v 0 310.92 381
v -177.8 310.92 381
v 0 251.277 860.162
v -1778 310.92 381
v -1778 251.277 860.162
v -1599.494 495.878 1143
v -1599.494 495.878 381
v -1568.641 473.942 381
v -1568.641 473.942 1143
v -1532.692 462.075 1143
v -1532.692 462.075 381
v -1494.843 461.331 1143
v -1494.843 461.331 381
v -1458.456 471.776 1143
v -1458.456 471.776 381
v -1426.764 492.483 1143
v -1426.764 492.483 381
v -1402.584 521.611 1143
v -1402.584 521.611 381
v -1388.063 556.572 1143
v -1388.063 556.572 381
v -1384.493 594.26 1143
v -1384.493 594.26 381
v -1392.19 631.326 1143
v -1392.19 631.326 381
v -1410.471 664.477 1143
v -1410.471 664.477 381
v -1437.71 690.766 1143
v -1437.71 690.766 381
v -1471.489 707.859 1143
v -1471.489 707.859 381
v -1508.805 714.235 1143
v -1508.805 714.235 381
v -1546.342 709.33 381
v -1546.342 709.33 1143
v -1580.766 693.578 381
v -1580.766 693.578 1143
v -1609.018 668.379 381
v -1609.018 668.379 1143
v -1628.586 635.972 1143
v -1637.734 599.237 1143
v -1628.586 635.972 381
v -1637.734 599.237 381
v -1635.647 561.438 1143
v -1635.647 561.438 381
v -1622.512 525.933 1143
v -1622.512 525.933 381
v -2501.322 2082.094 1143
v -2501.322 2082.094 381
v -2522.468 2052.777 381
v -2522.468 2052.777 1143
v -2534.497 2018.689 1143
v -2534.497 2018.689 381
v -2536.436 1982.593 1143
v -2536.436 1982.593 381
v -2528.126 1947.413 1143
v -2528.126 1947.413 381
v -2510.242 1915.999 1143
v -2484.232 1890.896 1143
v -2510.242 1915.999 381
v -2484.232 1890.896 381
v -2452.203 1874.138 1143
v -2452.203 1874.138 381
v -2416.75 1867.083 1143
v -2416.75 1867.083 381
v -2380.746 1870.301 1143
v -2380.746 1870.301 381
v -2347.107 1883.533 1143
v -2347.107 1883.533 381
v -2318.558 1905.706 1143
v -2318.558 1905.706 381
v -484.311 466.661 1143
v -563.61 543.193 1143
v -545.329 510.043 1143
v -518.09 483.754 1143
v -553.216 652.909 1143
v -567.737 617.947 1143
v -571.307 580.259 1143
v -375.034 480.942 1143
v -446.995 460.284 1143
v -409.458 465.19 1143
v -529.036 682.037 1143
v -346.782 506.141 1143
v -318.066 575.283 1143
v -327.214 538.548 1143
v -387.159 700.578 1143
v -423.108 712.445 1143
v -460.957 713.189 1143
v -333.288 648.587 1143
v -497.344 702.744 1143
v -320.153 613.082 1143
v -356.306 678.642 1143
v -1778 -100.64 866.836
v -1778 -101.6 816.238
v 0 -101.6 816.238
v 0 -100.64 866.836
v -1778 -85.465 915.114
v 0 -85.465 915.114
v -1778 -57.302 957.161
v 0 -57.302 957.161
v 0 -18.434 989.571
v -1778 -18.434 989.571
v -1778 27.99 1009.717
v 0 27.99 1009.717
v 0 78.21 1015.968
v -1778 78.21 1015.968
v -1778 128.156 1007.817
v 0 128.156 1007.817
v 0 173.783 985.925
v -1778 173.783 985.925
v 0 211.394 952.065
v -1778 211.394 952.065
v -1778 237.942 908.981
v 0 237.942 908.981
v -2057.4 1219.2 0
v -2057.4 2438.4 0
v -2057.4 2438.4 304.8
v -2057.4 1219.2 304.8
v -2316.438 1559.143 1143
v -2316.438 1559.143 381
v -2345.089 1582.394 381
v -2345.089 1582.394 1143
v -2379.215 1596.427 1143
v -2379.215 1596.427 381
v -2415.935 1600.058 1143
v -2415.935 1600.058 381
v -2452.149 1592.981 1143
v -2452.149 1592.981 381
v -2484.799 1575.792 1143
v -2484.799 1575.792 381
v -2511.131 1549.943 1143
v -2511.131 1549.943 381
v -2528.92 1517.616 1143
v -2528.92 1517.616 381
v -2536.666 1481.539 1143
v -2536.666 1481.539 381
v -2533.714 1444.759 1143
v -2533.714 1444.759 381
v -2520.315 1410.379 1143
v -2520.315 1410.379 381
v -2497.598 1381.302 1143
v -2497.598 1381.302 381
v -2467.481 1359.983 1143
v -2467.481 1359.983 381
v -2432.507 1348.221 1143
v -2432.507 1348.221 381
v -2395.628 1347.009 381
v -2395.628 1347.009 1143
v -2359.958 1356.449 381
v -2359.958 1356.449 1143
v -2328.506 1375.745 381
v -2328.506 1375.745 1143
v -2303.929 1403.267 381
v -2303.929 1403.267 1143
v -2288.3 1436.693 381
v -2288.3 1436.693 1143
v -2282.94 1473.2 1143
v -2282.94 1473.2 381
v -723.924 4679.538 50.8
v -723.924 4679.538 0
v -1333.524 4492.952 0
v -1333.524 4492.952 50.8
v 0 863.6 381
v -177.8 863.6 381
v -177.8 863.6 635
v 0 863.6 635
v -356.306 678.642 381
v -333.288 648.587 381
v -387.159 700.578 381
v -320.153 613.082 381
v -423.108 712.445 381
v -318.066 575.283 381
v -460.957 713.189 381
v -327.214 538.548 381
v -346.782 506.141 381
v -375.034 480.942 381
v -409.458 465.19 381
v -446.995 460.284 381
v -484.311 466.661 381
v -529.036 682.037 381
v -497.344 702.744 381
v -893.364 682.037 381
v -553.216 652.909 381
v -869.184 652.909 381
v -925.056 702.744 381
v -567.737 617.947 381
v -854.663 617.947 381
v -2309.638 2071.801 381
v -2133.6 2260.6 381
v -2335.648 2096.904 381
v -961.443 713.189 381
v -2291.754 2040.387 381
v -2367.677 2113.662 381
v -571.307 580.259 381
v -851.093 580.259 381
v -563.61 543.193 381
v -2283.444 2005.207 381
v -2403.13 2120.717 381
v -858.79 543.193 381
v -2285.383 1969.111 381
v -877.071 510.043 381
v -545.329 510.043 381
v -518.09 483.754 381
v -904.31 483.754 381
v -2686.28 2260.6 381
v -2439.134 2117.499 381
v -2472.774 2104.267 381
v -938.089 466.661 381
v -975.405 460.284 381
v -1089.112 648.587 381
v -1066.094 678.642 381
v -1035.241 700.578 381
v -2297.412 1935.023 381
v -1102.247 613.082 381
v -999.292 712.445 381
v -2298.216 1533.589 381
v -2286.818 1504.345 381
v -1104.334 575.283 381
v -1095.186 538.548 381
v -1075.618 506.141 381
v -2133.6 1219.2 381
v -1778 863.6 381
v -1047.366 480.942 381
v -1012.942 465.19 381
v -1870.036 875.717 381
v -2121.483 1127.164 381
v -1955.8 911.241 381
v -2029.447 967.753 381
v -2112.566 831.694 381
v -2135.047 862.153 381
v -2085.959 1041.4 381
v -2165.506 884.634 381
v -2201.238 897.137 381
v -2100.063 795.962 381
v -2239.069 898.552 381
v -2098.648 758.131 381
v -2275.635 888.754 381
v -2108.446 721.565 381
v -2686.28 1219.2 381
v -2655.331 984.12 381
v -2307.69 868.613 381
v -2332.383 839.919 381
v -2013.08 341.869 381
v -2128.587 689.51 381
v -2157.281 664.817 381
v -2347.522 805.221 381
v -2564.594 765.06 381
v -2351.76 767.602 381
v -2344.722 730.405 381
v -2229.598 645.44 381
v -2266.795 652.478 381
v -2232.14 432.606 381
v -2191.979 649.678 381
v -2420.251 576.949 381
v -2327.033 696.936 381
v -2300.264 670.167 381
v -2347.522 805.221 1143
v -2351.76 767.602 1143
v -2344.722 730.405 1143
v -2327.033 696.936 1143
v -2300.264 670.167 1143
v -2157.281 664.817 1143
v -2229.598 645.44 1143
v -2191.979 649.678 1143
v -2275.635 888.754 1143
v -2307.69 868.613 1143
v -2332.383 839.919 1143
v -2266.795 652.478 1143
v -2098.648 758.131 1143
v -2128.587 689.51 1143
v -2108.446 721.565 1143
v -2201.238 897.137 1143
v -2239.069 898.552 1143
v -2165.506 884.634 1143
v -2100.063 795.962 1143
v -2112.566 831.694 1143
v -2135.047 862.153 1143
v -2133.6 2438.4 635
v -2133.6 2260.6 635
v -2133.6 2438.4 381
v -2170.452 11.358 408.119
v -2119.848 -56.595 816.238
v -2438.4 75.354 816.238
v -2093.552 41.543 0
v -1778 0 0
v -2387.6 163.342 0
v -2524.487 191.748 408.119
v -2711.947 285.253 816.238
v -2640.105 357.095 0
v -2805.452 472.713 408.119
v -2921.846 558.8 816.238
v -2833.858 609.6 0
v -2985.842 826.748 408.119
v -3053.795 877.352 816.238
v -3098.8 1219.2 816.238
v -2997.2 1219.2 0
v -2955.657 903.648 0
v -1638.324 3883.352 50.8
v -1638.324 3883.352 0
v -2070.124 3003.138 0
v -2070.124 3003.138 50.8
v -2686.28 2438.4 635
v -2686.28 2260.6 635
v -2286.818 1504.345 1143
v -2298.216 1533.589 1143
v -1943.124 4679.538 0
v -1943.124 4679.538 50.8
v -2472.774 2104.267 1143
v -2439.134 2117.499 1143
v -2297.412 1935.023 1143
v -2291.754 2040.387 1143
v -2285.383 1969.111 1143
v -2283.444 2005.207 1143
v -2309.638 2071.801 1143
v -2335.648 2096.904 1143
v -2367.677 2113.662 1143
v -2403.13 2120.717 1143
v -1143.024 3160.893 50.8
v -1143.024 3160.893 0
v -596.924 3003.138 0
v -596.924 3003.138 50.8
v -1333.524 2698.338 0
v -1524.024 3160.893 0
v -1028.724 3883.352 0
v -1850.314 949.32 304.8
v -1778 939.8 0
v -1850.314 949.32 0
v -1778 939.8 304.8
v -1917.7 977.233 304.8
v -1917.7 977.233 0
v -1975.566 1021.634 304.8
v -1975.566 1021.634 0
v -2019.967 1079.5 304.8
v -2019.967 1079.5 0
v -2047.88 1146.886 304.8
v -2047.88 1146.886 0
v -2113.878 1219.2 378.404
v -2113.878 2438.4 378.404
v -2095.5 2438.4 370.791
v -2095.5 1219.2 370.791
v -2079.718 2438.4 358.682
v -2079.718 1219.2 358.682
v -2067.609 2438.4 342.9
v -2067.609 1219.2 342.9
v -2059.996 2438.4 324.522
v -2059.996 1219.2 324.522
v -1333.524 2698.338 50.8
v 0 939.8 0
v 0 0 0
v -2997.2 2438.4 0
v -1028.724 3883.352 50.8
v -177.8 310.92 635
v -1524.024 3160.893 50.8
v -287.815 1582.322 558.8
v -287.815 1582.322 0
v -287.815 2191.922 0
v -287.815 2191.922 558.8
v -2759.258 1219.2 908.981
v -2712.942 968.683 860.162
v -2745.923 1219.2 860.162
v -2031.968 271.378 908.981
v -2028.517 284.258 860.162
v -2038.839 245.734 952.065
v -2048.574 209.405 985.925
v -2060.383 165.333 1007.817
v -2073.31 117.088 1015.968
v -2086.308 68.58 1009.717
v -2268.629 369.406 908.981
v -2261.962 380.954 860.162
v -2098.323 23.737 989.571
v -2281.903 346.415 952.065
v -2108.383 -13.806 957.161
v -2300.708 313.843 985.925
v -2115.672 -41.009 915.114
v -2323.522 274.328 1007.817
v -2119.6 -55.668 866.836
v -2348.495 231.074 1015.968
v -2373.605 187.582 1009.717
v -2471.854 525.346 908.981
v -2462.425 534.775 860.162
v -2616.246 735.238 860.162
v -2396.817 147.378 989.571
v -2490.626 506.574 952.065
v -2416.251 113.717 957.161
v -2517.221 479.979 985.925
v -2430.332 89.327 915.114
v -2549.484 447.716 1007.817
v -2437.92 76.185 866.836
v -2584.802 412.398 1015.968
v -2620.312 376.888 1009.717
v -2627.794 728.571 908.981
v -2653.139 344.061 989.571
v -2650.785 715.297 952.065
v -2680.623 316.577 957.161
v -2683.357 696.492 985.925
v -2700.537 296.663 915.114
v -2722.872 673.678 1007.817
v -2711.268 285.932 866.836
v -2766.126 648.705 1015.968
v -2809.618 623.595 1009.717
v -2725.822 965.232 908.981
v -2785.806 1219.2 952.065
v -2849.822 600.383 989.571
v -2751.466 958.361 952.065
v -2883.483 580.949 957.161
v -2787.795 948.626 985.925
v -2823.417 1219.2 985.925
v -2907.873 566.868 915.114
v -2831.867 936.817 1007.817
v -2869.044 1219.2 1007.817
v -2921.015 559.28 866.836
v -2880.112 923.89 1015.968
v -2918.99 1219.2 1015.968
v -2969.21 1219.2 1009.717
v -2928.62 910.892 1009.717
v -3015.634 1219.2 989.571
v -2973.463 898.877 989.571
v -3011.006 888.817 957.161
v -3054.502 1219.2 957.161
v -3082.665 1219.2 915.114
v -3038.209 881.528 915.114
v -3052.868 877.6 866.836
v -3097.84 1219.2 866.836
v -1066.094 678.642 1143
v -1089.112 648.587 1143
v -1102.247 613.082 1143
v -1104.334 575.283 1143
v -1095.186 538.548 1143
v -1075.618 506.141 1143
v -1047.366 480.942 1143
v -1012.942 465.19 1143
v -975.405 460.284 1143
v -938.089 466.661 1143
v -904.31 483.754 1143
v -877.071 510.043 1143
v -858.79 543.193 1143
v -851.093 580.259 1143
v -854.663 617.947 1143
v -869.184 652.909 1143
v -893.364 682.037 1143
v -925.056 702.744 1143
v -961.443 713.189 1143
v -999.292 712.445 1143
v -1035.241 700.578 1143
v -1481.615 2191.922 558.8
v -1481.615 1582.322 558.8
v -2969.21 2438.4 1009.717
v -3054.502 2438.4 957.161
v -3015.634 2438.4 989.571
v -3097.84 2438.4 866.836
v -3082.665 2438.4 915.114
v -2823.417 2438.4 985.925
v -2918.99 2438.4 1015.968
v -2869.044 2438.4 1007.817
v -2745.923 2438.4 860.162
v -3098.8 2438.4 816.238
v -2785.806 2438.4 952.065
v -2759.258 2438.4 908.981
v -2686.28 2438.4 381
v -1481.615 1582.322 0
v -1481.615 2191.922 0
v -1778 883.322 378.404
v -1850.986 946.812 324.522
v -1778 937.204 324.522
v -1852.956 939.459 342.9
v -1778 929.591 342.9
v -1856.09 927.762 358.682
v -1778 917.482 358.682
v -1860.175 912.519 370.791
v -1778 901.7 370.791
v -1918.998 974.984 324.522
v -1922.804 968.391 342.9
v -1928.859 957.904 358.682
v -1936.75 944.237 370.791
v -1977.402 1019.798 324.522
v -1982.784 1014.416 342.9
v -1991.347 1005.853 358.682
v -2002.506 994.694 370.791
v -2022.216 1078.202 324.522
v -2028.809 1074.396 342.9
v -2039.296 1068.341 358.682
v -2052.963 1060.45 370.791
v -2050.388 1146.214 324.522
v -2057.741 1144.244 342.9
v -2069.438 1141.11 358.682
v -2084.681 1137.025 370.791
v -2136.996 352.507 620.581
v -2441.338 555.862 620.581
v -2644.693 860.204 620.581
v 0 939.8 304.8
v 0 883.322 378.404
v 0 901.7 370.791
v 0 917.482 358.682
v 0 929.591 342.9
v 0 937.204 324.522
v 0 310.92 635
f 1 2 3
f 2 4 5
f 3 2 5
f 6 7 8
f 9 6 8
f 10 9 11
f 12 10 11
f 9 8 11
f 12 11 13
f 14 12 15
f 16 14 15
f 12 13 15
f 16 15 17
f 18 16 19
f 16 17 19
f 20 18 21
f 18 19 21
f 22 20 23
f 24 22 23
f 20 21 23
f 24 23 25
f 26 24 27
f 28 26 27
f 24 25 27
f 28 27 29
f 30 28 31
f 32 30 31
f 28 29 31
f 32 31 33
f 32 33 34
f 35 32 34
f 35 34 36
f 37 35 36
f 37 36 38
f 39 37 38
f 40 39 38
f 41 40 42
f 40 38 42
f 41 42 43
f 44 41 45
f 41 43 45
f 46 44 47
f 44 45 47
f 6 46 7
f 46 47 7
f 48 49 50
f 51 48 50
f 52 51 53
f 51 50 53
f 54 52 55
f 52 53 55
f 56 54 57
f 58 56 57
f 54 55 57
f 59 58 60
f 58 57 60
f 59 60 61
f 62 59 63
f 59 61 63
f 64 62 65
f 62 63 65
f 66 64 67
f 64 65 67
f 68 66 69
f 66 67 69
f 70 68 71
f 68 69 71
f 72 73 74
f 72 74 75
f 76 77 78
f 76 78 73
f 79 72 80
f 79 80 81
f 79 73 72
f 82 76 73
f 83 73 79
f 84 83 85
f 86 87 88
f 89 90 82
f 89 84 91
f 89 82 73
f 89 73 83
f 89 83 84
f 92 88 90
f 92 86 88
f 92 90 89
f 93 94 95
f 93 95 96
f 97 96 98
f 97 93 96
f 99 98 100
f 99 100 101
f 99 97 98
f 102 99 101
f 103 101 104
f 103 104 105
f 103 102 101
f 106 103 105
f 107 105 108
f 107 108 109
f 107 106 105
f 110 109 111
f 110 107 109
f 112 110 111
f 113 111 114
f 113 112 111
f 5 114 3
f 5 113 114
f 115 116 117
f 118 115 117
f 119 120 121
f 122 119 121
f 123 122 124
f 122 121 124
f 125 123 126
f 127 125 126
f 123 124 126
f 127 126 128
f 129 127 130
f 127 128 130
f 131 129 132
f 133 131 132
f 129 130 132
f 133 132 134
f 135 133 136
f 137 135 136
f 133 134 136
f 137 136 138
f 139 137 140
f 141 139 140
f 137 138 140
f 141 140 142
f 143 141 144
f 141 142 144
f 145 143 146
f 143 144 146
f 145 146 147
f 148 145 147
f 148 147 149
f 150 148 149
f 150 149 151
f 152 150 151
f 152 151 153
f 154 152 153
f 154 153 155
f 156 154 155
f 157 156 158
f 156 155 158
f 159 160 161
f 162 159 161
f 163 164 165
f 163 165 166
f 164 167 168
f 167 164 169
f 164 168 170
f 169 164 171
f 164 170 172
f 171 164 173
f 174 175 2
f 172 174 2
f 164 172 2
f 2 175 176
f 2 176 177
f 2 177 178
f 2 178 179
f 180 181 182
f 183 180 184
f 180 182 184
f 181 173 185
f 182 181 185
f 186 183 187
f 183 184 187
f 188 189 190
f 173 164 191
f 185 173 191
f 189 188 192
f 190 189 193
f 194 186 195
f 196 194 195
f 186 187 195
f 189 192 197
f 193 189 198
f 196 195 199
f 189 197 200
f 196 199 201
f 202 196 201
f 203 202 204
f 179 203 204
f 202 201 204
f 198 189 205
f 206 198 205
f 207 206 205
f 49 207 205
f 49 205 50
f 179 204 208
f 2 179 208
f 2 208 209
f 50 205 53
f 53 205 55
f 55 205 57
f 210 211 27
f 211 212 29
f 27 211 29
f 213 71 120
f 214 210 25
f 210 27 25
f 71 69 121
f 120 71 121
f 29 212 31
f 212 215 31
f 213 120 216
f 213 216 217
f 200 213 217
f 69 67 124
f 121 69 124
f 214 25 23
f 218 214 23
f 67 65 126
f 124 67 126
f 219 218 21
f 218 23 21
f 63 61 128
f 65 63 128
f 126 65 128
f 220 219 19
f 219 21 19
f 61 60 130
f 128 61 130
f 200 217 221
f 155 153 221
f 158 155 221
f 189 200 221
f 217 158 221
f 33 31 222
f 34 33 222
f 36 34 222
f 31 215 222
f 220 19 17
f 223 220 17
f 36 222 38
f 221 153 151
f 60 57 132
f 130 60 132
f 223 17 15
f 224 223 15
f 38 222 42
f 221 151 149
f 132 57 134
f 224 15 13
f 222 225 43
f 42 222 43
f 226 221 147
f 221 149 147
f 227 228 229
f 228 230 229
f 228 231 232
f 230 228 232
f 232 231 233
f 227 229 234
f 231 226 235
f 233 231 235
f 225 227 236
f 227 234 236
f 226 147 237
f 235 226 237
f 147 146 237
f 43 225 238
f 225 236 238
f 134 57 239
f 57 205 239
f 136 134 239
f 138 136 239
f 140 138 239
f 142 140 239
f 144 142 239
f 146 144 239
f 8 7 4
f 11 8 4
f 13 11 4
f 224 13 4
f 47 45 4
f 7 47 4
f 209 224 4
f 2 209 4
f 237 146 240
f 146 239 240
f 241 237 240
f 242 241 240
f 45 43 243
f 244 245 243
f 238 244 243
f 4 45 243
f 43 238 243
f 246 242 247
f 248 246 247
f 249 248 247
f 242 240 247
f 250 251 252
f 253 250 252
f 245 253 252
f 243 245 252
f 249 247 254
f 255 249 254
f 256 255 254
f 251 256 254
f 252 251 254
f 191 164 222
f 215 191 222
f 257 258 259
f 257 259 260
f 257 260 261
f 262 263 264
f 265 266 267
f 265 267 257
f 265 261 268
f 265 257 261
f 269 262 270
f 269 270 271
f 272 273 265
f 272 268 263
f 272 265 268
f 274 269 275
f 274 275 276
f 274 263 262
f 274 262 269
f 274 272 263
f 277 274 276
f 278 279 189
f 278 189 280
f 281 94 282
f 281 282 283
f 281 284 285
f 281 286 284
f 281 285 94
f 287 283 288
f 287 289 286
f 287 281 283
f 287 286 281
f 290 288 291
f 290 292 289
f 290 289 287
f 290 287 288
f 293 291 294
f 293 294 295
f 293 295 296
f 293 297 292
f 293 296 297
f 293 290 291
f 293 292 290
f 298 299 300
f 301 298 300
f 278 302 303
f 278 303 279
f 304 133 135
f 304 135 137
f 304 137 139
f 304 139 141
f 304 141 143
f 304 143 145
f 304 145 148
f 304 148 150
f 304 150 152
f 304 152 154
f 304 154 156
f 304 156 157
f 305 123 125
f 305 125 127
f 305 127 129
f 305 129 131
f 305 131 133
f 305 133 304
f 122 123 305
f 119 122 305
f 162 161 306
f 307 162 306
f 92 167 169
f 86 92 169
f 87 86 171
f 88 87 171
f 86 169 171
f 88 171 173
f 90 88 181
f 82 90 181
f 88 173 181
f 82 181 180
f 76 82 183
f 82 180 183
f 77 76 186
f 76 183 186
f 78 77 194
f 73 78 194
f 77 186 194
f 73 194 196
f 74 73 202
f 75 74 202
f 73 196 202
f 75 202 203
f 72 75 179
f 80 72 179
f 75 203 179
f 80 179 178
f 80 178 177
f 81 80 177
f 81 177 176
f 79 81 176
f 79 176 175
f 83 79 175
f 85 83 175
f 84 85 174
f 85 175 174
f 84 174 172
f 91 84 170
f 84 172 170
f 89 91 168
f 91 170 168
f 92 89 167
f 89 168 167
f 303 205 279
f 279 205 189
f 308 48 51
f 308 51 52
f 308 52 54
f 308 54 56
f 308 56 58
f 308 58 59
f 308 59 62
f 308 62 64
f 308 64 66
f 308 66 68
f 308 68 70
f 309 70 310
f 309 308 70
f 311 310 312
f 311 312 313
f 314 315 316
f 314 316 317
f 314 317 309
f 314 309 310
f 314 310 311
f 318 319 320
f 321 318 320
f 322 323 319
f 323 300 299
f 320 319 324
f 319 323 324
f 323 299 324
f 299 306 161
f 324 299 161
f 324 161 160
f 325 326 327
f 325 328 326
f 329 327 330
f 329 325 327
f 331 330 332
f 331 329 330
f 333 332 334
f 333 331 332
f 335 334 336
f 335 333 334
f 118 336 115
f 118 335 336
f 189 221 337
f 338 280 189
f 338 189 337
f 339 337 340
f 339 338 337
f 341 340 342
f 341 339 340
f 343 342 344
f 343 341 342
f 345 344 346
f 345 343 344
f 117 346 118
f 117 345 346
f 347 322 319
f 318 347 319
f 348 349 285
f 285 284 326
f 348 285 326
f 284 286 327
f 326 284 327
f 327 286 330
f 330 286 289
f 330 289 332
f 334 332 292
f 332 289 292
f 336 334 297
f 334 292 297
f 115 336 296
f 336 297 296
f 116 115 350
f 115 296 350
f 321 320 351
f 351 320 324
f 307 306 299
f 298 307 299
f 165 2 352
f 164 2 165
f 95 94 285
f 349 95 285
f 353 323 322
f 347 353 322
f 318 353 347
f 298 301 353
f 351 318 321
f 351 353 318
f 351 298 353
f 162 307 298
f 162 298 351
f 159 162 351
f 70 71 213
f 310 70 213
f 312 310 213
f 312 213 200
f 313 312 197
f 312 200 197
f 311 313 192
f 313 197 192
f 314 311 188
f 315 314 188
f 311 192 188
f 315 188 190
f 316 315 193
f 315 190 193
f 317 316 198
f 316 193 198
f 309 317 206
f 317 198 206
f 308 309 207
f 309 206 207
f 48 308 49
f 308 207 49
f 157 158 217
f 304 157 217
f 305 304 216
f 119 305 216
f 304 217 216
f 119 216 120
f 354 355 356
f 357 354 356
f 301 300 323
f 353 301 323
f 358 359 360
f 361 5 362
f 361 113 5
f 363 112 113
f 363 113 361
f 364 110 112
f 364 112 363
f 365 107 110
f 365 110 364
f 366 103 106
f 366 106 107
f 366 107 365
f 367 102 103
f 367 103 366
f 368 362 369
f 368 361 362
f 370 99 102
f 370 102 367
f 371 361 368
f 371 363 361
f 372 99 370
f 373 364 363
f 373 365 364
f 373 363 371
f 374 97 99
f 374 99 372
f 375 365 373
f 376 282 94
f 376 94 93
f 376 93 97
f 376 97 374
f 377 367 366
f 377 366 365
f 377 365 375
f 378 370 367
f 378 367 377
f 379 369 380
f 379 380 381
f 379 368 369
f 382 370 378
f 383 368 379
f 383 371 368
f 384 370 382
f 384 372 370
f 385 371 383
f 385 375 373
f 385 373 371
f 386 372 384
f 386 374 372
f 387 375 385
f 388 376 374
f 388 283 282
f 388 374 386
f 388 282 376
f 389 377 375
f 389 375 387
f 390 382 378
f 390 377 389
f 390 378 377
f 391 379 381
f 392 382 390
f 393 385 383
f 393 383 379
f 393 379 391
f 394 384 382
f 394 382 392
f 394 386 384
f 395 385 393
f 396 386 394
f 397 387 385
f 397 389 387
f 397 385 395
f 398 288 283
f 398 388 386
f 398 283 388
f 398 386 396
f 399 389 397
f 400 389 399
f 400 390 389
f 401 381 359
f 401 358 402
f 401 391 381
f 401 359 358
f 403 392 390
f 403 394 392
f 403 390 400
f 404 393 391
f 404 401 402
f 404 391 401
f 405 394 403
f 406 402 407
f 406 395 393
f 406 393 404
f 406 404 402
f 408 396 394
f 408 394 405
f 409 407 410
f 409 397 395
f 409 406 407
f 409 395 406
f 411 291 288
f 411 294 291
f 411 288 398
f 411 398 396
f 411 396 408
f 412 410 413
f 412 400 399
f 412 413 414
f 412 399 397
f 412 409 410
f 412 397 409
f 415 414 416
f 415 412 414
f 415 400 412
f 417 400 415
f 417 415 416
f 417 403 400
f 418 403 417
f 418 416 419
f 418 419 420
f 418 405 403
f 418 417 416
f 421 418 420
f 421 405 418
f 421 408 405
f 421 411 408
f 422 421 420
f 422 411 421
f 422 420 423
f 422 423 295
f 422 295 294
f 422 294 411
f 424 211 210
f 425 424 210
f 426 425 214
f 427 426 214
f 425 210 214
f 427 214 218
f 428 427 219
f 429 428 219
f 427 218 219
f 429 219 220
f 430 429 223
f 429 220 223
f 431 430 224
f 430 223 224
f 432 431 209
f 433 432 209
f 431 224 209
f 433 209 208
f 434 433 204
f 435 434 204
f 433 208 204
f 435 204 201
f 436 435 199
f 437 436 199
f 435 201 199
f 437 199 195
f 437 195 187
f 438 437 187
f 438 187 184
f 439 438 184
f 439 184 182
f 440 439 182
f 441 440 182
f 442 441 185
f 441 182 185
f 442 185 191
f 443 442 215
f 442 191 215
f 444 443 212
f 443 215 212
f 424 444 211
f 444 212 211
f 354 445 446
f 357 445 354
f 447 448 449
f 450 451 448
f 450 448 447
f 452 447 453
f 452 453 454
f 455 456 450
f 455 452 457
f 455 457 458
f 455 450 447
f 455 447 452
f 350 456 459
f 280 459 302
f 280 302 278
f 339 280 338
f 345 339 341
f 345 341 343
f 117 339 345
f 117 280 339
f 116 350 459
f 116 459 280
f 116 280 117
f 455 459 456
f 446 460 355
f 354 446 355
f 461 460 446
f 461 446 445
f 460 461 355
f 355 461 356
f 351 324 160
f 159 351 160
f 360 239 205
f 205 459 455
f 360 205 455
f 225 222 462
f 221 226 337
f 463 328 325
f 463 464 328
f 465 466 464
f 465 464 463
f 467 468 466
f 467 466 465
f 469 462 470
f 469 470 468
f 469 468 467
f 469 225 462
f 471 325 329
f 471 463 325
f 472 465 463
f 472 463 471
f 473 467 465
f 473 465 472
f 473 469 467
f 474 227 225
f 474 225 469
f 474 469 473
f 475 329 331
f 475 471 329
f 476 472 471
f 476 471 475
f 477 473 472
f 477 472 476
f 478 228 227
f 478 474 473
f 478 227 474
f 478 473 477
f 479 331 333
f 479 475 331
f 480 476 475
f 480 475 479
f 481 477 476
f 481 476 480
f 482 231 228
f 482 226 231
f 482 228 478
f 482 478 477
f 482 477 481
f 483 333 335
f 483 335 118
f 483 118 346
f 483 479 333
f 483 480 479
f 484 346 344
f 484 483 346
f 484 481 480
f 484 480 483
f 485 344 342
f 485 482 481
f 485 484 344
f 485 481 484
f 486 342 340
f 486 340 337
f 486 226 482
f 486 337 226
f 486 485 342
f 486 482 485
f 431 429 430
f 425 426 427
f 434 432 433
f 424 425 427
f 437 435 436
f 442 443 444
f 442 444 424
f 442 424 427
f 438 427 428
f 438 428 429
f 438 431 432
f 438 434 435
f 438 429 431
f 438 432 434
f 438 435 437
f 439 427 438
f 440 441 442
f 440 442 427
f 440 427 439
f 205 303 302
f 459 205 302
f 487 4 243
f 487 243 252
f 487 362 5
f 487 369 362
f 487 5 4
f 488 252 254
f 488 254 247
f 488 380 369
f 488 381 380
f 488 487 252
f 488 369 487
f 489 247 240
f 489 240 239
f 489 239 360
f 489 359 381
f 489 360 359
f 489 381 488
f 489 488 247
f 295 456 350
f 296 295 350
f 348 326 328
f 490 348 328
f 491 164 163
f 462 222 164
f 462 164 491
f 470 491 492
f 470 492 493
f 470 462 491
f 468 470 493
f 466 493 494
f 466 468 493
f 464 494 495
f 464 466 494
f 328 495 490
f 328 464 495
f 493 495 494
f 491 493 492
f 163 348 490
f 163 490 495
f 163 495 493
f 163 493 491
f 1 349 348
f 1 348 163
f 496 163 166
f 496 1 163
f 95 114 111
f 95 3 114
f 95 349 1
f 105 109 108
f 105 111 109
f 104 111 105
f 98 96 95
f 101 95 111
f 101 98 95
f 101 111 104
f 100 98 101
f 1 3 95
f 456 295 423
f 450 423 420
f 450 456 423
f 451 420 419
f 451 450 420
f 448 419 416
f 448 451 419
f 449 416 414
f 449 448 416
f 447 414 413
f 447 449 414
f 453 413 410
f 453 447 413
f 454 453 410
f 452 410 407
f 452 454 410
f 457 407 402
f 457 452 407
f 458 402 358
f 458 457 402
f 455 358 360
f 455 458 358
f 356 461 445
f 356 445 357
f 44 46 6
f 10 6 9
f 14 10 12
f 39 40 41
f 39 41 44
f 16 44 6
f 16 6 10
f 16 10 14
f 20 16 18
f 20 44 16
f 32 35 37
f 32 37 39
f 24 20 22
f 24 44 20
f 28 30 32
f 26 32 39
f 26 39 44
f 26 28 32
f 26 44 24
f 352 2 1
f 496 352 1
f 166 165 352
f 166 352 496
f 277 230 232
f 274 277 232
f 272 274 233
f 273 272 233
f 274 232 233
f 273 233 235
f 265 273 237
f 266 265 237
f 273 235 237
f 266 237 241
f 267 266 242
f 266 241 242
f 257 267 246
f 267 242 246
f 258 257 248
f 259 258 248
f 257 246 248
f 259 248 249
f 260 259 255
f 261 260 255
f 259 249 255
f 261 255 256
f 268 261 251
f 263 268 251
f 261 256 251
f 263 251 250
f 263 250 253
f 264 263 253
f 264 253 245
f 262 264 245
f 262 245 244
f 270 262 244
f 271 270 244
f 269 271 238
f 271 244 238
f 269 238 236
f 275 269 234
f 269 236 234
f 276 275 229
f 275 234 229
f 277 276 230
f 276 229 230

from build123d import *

# Parameters (mm, degrees)
F3_W     = 552.6802154407
F3_H     = 177.8
F3_W_2   = 177.8
F3_H_2   = 552.6802154407
F4_DEPTH = 254
F5_DEPTH = 762
F6_W     = 1193.8
F6_H     = 609.6
F7_DEPTH = 558.8
F8_DEPTH = 50.8


with BuildPart() as f2:
    # F2: sweep along a path in F1
    with BuildLine(Plane.XY) as f2_path:
        Line((0, 0), (-1778, 0))
        ThreePointArc((-1778, 0), (-2640.1045876226, 357.0954123774), (-2997.2, 1219.2))
        Line((-2997.2, 1219.2), (-2997.2, 2438.4))
    # F0 (on Right) → F2 (sweep)
    with BuildSketch(Plane.YZ):
        with BuildLine():
            Line((251.2768326259, 860.1619044934), (-101.6, 816.2380955066))
            Line((-101.6, 816.2380955066), (0, 0))
            Line((0, 0), (939.8, 0))
            Line((939.8, 0), (939.8, 304.8))
            ThreePointArc((939.8, 304.8), (917.4815367264, 358.6815367264), (863.6, 381))
            Line((863.6, 381), (310.9197845593, 381))
            Line((310.9197845593, 381), (251.2768326259, 860.1619044934))
        make_face()
        with BuildLine():
            ThreePointArc((251.2768326259, 860.1619044934), (52.8765118195, 1014.638416313), (-101.6, 816.2380955066))
            Line((-101.6, 816.2380955066), (251.2768326259, 860.1619044934))
        make_face()
    sweep(path=f2_path.line)

    # F3 (on face) → F4 (join)
    with BuildSketch(Plane.XY.offset(381)):
        with Locations((-2409.9401077203, 2349.5)):
            Rectangle(F3_W, F3_H)
        with Locations((-88.9, 587.2598922797)):
            Rectangle(F3_W_2, F3_H_2)
    extrude(amount=F4_DEPTH)

    # F3 (on face) → F5 (join)
    with BuildSketch(Plane.XY.offset(381)):
        with BuildLine():
            ThreePointArc((-317.5, 587.2598922797), (-327.6032527286, 636.9001025669), (-356.3055193286, 678.6422405702))
            Line((-356.3055193286, 678.6422405702), (-532.6944806714, 495.8775439891))
            ThreePointArc((-532.6944806714, 495.8775439891), (-394.8597897127, 470.3631450082), (-317.5, 587.2598922797))
        make_face()
        with BuildLine():
            Line((-532.6944806714, 495.8775439891), (-356.3055193286, 678.6422405702))
            ThreePointArc((-356.3055193286, 678.6422405702), (-535.8823482905, 675.4543729511), (-532.6944806714, 495.8775439891))
        make_face()
        with BuildLine():
            ThreePointArc((-850.9, 587.2598922797), (-928.2597897127, 704.1566395511), (-1066.0944806714, 678.6422405702))
            Line((-1066.0944806714, 678.6422405702), (-889.7055193286, 495.8775439891))
            ThreePointArc((-889.7055193286, 495.8775439891), (-861.0032527286, 537.6196819924), (-850.9, 587.2598922797))
        make_face()
        with BuildLine():
            Line((-889.7055193286, 495.8775439891), (-1066.0944806714, 678.6422405702))
            ThreePointArc((-1066.0944806714, 678.6422405702), (-1069.2823482905, 499.0654116082), (-889.7055193286, 495.8775439891))
        make_face()
        with BuildLine():
            Line((-1599.4944806714, 495.8775439891), (-1423.1055193286, 678.6422405702))
            ThreePointArc((-1423.1055193286, 678.6422405702), (-1602.6823482905, 675.4543729511), (-1599.4944806714, 495.8775439891))
        make_face()
        with BuildLine():
            ThreePointArc((-1384.3, 587.2598922797), (-1394.4032527286, 636.9001025669), (-1423.1055193286, 678.6422405702))
            Line((-1423.1055193286, 678.6422405702), (-1599.4944806714, 495.8775439891))
            ThreePointArc((-1599.4944806714, 495.8775439891), (-1461.6597897127, 470.3631450083), (-1384.3, 587.2598922797))
        make_face()
        with BuildLine():
            Line((-2314.6516966835, 682.5483033165), (-2135.0465742621, 862.1534257379))
            ThreePointArc((-2135.0465742621, 862.1534257379), (-2314.6516966835, 862.1534257379), (-2314.6516966835, 682.5483033165))
        make_face()
        with BuildLine():
            ThreePointArc((-2097.8491354728, 772.3508645272), (-2107.5164348439, 820.9516604376), (-2135.0465742621, 862.1534257379))
            Line((-2135.0465742621, 862.1534257379), (-2314.6516966835, 682.5483033165))
            ThreePointArc((-2314.6516966835, 682.5483033165), (-2176.2483395624, 655.0181638983), (-2097.8491354728, 772.3508645272))
        make_face()
        with BuildLine():
            Line((-2503.4426017878, 1387.2565092449), (-2316.4376136529, 1559.1434907551))
            ThreePointArc((-2316.4376136529, 1559.1434907551), (-2495.8835984754, 1566.7024940674), (-2503.4426017878, 1387.2565092449))
        make_face()
        with BuildLine():
            ThreePointArc((-2282.9401077203, 1473.2), (-2291.6104479842, 1519.3204035836), (-2316.4376136529, 1559.1434907551))
            Line((-2316.4376136529, 1559.1434907551), (-2503.4426017878, 1387.2565092449))
            ThreePointArc((-2503.4426017878, 1387.2565092449), (-2363.8197041367, 1354.8703402638), (-2282.9401077203, 1473.2))
        make_face()
        with BuildLine():
            ThreePointArc((-2501.3224560109, 2082.0944806715), (-2498.1345883918, 1902.5176517095), (-2318.5577594298, 1905.7055193286))
            Line((-2318.5577594298, 1905.7055193286), (-2501.3224560109, 2082.0944806714))
        make_face()
        with BuildLine():
            Line((-2501.3224560109, 2082.0944806714), (-2318.5577594298, 1905.7055193286))
            ThreePointArc((-2318.5577594298, 1905.7055193286), (-2292.1806957124, 1946.3424466194), (-2282.9401077203, 1993.9))
            ThreePointArc((-2282.9401077203, 1993.9), (-2362.3825543397, 2111.6594120079), (-2501.3224560109, 2082.0944806715))
        make_face()
    extrude(amount=F5_DEPTH)


with BuildPart() as f7:
    # F6 (on Top) → F7 (new body)
    with BuildSketch(Plane.XY):
        with Locations((-884.7150955342, 1887.1219158173)):
            Rectangle(F6_W, F6_H)
    extrude(amount=F7_DEPTH)


with BuildPart() as f8:
    # F6 (on Top) → F8 (new body)
    with BuildSketch(Plane.XY):
        Polygon((-1524.0235568264, 3160.8933018048), (-1333.5235568264, 2698.3379268963), (-1143.0235568264, 3160.8933018048), (-596.9235568264, 3003.1379268963), (-1028.7235568264, 3883.3520412445), (-723.9235568264, 4679.5379268963), (-1333.5235568264, 4492.9520412445), (-1943.1235568264, 4679.5379268963), (-1638.3235568264, 3883.3520412445), (-2070.1235568264, 3003.1379268963), align=None)
    extrude(amount=F8_DEPTH)


solid = Compound([f2.part, f7.part, f8.part])
